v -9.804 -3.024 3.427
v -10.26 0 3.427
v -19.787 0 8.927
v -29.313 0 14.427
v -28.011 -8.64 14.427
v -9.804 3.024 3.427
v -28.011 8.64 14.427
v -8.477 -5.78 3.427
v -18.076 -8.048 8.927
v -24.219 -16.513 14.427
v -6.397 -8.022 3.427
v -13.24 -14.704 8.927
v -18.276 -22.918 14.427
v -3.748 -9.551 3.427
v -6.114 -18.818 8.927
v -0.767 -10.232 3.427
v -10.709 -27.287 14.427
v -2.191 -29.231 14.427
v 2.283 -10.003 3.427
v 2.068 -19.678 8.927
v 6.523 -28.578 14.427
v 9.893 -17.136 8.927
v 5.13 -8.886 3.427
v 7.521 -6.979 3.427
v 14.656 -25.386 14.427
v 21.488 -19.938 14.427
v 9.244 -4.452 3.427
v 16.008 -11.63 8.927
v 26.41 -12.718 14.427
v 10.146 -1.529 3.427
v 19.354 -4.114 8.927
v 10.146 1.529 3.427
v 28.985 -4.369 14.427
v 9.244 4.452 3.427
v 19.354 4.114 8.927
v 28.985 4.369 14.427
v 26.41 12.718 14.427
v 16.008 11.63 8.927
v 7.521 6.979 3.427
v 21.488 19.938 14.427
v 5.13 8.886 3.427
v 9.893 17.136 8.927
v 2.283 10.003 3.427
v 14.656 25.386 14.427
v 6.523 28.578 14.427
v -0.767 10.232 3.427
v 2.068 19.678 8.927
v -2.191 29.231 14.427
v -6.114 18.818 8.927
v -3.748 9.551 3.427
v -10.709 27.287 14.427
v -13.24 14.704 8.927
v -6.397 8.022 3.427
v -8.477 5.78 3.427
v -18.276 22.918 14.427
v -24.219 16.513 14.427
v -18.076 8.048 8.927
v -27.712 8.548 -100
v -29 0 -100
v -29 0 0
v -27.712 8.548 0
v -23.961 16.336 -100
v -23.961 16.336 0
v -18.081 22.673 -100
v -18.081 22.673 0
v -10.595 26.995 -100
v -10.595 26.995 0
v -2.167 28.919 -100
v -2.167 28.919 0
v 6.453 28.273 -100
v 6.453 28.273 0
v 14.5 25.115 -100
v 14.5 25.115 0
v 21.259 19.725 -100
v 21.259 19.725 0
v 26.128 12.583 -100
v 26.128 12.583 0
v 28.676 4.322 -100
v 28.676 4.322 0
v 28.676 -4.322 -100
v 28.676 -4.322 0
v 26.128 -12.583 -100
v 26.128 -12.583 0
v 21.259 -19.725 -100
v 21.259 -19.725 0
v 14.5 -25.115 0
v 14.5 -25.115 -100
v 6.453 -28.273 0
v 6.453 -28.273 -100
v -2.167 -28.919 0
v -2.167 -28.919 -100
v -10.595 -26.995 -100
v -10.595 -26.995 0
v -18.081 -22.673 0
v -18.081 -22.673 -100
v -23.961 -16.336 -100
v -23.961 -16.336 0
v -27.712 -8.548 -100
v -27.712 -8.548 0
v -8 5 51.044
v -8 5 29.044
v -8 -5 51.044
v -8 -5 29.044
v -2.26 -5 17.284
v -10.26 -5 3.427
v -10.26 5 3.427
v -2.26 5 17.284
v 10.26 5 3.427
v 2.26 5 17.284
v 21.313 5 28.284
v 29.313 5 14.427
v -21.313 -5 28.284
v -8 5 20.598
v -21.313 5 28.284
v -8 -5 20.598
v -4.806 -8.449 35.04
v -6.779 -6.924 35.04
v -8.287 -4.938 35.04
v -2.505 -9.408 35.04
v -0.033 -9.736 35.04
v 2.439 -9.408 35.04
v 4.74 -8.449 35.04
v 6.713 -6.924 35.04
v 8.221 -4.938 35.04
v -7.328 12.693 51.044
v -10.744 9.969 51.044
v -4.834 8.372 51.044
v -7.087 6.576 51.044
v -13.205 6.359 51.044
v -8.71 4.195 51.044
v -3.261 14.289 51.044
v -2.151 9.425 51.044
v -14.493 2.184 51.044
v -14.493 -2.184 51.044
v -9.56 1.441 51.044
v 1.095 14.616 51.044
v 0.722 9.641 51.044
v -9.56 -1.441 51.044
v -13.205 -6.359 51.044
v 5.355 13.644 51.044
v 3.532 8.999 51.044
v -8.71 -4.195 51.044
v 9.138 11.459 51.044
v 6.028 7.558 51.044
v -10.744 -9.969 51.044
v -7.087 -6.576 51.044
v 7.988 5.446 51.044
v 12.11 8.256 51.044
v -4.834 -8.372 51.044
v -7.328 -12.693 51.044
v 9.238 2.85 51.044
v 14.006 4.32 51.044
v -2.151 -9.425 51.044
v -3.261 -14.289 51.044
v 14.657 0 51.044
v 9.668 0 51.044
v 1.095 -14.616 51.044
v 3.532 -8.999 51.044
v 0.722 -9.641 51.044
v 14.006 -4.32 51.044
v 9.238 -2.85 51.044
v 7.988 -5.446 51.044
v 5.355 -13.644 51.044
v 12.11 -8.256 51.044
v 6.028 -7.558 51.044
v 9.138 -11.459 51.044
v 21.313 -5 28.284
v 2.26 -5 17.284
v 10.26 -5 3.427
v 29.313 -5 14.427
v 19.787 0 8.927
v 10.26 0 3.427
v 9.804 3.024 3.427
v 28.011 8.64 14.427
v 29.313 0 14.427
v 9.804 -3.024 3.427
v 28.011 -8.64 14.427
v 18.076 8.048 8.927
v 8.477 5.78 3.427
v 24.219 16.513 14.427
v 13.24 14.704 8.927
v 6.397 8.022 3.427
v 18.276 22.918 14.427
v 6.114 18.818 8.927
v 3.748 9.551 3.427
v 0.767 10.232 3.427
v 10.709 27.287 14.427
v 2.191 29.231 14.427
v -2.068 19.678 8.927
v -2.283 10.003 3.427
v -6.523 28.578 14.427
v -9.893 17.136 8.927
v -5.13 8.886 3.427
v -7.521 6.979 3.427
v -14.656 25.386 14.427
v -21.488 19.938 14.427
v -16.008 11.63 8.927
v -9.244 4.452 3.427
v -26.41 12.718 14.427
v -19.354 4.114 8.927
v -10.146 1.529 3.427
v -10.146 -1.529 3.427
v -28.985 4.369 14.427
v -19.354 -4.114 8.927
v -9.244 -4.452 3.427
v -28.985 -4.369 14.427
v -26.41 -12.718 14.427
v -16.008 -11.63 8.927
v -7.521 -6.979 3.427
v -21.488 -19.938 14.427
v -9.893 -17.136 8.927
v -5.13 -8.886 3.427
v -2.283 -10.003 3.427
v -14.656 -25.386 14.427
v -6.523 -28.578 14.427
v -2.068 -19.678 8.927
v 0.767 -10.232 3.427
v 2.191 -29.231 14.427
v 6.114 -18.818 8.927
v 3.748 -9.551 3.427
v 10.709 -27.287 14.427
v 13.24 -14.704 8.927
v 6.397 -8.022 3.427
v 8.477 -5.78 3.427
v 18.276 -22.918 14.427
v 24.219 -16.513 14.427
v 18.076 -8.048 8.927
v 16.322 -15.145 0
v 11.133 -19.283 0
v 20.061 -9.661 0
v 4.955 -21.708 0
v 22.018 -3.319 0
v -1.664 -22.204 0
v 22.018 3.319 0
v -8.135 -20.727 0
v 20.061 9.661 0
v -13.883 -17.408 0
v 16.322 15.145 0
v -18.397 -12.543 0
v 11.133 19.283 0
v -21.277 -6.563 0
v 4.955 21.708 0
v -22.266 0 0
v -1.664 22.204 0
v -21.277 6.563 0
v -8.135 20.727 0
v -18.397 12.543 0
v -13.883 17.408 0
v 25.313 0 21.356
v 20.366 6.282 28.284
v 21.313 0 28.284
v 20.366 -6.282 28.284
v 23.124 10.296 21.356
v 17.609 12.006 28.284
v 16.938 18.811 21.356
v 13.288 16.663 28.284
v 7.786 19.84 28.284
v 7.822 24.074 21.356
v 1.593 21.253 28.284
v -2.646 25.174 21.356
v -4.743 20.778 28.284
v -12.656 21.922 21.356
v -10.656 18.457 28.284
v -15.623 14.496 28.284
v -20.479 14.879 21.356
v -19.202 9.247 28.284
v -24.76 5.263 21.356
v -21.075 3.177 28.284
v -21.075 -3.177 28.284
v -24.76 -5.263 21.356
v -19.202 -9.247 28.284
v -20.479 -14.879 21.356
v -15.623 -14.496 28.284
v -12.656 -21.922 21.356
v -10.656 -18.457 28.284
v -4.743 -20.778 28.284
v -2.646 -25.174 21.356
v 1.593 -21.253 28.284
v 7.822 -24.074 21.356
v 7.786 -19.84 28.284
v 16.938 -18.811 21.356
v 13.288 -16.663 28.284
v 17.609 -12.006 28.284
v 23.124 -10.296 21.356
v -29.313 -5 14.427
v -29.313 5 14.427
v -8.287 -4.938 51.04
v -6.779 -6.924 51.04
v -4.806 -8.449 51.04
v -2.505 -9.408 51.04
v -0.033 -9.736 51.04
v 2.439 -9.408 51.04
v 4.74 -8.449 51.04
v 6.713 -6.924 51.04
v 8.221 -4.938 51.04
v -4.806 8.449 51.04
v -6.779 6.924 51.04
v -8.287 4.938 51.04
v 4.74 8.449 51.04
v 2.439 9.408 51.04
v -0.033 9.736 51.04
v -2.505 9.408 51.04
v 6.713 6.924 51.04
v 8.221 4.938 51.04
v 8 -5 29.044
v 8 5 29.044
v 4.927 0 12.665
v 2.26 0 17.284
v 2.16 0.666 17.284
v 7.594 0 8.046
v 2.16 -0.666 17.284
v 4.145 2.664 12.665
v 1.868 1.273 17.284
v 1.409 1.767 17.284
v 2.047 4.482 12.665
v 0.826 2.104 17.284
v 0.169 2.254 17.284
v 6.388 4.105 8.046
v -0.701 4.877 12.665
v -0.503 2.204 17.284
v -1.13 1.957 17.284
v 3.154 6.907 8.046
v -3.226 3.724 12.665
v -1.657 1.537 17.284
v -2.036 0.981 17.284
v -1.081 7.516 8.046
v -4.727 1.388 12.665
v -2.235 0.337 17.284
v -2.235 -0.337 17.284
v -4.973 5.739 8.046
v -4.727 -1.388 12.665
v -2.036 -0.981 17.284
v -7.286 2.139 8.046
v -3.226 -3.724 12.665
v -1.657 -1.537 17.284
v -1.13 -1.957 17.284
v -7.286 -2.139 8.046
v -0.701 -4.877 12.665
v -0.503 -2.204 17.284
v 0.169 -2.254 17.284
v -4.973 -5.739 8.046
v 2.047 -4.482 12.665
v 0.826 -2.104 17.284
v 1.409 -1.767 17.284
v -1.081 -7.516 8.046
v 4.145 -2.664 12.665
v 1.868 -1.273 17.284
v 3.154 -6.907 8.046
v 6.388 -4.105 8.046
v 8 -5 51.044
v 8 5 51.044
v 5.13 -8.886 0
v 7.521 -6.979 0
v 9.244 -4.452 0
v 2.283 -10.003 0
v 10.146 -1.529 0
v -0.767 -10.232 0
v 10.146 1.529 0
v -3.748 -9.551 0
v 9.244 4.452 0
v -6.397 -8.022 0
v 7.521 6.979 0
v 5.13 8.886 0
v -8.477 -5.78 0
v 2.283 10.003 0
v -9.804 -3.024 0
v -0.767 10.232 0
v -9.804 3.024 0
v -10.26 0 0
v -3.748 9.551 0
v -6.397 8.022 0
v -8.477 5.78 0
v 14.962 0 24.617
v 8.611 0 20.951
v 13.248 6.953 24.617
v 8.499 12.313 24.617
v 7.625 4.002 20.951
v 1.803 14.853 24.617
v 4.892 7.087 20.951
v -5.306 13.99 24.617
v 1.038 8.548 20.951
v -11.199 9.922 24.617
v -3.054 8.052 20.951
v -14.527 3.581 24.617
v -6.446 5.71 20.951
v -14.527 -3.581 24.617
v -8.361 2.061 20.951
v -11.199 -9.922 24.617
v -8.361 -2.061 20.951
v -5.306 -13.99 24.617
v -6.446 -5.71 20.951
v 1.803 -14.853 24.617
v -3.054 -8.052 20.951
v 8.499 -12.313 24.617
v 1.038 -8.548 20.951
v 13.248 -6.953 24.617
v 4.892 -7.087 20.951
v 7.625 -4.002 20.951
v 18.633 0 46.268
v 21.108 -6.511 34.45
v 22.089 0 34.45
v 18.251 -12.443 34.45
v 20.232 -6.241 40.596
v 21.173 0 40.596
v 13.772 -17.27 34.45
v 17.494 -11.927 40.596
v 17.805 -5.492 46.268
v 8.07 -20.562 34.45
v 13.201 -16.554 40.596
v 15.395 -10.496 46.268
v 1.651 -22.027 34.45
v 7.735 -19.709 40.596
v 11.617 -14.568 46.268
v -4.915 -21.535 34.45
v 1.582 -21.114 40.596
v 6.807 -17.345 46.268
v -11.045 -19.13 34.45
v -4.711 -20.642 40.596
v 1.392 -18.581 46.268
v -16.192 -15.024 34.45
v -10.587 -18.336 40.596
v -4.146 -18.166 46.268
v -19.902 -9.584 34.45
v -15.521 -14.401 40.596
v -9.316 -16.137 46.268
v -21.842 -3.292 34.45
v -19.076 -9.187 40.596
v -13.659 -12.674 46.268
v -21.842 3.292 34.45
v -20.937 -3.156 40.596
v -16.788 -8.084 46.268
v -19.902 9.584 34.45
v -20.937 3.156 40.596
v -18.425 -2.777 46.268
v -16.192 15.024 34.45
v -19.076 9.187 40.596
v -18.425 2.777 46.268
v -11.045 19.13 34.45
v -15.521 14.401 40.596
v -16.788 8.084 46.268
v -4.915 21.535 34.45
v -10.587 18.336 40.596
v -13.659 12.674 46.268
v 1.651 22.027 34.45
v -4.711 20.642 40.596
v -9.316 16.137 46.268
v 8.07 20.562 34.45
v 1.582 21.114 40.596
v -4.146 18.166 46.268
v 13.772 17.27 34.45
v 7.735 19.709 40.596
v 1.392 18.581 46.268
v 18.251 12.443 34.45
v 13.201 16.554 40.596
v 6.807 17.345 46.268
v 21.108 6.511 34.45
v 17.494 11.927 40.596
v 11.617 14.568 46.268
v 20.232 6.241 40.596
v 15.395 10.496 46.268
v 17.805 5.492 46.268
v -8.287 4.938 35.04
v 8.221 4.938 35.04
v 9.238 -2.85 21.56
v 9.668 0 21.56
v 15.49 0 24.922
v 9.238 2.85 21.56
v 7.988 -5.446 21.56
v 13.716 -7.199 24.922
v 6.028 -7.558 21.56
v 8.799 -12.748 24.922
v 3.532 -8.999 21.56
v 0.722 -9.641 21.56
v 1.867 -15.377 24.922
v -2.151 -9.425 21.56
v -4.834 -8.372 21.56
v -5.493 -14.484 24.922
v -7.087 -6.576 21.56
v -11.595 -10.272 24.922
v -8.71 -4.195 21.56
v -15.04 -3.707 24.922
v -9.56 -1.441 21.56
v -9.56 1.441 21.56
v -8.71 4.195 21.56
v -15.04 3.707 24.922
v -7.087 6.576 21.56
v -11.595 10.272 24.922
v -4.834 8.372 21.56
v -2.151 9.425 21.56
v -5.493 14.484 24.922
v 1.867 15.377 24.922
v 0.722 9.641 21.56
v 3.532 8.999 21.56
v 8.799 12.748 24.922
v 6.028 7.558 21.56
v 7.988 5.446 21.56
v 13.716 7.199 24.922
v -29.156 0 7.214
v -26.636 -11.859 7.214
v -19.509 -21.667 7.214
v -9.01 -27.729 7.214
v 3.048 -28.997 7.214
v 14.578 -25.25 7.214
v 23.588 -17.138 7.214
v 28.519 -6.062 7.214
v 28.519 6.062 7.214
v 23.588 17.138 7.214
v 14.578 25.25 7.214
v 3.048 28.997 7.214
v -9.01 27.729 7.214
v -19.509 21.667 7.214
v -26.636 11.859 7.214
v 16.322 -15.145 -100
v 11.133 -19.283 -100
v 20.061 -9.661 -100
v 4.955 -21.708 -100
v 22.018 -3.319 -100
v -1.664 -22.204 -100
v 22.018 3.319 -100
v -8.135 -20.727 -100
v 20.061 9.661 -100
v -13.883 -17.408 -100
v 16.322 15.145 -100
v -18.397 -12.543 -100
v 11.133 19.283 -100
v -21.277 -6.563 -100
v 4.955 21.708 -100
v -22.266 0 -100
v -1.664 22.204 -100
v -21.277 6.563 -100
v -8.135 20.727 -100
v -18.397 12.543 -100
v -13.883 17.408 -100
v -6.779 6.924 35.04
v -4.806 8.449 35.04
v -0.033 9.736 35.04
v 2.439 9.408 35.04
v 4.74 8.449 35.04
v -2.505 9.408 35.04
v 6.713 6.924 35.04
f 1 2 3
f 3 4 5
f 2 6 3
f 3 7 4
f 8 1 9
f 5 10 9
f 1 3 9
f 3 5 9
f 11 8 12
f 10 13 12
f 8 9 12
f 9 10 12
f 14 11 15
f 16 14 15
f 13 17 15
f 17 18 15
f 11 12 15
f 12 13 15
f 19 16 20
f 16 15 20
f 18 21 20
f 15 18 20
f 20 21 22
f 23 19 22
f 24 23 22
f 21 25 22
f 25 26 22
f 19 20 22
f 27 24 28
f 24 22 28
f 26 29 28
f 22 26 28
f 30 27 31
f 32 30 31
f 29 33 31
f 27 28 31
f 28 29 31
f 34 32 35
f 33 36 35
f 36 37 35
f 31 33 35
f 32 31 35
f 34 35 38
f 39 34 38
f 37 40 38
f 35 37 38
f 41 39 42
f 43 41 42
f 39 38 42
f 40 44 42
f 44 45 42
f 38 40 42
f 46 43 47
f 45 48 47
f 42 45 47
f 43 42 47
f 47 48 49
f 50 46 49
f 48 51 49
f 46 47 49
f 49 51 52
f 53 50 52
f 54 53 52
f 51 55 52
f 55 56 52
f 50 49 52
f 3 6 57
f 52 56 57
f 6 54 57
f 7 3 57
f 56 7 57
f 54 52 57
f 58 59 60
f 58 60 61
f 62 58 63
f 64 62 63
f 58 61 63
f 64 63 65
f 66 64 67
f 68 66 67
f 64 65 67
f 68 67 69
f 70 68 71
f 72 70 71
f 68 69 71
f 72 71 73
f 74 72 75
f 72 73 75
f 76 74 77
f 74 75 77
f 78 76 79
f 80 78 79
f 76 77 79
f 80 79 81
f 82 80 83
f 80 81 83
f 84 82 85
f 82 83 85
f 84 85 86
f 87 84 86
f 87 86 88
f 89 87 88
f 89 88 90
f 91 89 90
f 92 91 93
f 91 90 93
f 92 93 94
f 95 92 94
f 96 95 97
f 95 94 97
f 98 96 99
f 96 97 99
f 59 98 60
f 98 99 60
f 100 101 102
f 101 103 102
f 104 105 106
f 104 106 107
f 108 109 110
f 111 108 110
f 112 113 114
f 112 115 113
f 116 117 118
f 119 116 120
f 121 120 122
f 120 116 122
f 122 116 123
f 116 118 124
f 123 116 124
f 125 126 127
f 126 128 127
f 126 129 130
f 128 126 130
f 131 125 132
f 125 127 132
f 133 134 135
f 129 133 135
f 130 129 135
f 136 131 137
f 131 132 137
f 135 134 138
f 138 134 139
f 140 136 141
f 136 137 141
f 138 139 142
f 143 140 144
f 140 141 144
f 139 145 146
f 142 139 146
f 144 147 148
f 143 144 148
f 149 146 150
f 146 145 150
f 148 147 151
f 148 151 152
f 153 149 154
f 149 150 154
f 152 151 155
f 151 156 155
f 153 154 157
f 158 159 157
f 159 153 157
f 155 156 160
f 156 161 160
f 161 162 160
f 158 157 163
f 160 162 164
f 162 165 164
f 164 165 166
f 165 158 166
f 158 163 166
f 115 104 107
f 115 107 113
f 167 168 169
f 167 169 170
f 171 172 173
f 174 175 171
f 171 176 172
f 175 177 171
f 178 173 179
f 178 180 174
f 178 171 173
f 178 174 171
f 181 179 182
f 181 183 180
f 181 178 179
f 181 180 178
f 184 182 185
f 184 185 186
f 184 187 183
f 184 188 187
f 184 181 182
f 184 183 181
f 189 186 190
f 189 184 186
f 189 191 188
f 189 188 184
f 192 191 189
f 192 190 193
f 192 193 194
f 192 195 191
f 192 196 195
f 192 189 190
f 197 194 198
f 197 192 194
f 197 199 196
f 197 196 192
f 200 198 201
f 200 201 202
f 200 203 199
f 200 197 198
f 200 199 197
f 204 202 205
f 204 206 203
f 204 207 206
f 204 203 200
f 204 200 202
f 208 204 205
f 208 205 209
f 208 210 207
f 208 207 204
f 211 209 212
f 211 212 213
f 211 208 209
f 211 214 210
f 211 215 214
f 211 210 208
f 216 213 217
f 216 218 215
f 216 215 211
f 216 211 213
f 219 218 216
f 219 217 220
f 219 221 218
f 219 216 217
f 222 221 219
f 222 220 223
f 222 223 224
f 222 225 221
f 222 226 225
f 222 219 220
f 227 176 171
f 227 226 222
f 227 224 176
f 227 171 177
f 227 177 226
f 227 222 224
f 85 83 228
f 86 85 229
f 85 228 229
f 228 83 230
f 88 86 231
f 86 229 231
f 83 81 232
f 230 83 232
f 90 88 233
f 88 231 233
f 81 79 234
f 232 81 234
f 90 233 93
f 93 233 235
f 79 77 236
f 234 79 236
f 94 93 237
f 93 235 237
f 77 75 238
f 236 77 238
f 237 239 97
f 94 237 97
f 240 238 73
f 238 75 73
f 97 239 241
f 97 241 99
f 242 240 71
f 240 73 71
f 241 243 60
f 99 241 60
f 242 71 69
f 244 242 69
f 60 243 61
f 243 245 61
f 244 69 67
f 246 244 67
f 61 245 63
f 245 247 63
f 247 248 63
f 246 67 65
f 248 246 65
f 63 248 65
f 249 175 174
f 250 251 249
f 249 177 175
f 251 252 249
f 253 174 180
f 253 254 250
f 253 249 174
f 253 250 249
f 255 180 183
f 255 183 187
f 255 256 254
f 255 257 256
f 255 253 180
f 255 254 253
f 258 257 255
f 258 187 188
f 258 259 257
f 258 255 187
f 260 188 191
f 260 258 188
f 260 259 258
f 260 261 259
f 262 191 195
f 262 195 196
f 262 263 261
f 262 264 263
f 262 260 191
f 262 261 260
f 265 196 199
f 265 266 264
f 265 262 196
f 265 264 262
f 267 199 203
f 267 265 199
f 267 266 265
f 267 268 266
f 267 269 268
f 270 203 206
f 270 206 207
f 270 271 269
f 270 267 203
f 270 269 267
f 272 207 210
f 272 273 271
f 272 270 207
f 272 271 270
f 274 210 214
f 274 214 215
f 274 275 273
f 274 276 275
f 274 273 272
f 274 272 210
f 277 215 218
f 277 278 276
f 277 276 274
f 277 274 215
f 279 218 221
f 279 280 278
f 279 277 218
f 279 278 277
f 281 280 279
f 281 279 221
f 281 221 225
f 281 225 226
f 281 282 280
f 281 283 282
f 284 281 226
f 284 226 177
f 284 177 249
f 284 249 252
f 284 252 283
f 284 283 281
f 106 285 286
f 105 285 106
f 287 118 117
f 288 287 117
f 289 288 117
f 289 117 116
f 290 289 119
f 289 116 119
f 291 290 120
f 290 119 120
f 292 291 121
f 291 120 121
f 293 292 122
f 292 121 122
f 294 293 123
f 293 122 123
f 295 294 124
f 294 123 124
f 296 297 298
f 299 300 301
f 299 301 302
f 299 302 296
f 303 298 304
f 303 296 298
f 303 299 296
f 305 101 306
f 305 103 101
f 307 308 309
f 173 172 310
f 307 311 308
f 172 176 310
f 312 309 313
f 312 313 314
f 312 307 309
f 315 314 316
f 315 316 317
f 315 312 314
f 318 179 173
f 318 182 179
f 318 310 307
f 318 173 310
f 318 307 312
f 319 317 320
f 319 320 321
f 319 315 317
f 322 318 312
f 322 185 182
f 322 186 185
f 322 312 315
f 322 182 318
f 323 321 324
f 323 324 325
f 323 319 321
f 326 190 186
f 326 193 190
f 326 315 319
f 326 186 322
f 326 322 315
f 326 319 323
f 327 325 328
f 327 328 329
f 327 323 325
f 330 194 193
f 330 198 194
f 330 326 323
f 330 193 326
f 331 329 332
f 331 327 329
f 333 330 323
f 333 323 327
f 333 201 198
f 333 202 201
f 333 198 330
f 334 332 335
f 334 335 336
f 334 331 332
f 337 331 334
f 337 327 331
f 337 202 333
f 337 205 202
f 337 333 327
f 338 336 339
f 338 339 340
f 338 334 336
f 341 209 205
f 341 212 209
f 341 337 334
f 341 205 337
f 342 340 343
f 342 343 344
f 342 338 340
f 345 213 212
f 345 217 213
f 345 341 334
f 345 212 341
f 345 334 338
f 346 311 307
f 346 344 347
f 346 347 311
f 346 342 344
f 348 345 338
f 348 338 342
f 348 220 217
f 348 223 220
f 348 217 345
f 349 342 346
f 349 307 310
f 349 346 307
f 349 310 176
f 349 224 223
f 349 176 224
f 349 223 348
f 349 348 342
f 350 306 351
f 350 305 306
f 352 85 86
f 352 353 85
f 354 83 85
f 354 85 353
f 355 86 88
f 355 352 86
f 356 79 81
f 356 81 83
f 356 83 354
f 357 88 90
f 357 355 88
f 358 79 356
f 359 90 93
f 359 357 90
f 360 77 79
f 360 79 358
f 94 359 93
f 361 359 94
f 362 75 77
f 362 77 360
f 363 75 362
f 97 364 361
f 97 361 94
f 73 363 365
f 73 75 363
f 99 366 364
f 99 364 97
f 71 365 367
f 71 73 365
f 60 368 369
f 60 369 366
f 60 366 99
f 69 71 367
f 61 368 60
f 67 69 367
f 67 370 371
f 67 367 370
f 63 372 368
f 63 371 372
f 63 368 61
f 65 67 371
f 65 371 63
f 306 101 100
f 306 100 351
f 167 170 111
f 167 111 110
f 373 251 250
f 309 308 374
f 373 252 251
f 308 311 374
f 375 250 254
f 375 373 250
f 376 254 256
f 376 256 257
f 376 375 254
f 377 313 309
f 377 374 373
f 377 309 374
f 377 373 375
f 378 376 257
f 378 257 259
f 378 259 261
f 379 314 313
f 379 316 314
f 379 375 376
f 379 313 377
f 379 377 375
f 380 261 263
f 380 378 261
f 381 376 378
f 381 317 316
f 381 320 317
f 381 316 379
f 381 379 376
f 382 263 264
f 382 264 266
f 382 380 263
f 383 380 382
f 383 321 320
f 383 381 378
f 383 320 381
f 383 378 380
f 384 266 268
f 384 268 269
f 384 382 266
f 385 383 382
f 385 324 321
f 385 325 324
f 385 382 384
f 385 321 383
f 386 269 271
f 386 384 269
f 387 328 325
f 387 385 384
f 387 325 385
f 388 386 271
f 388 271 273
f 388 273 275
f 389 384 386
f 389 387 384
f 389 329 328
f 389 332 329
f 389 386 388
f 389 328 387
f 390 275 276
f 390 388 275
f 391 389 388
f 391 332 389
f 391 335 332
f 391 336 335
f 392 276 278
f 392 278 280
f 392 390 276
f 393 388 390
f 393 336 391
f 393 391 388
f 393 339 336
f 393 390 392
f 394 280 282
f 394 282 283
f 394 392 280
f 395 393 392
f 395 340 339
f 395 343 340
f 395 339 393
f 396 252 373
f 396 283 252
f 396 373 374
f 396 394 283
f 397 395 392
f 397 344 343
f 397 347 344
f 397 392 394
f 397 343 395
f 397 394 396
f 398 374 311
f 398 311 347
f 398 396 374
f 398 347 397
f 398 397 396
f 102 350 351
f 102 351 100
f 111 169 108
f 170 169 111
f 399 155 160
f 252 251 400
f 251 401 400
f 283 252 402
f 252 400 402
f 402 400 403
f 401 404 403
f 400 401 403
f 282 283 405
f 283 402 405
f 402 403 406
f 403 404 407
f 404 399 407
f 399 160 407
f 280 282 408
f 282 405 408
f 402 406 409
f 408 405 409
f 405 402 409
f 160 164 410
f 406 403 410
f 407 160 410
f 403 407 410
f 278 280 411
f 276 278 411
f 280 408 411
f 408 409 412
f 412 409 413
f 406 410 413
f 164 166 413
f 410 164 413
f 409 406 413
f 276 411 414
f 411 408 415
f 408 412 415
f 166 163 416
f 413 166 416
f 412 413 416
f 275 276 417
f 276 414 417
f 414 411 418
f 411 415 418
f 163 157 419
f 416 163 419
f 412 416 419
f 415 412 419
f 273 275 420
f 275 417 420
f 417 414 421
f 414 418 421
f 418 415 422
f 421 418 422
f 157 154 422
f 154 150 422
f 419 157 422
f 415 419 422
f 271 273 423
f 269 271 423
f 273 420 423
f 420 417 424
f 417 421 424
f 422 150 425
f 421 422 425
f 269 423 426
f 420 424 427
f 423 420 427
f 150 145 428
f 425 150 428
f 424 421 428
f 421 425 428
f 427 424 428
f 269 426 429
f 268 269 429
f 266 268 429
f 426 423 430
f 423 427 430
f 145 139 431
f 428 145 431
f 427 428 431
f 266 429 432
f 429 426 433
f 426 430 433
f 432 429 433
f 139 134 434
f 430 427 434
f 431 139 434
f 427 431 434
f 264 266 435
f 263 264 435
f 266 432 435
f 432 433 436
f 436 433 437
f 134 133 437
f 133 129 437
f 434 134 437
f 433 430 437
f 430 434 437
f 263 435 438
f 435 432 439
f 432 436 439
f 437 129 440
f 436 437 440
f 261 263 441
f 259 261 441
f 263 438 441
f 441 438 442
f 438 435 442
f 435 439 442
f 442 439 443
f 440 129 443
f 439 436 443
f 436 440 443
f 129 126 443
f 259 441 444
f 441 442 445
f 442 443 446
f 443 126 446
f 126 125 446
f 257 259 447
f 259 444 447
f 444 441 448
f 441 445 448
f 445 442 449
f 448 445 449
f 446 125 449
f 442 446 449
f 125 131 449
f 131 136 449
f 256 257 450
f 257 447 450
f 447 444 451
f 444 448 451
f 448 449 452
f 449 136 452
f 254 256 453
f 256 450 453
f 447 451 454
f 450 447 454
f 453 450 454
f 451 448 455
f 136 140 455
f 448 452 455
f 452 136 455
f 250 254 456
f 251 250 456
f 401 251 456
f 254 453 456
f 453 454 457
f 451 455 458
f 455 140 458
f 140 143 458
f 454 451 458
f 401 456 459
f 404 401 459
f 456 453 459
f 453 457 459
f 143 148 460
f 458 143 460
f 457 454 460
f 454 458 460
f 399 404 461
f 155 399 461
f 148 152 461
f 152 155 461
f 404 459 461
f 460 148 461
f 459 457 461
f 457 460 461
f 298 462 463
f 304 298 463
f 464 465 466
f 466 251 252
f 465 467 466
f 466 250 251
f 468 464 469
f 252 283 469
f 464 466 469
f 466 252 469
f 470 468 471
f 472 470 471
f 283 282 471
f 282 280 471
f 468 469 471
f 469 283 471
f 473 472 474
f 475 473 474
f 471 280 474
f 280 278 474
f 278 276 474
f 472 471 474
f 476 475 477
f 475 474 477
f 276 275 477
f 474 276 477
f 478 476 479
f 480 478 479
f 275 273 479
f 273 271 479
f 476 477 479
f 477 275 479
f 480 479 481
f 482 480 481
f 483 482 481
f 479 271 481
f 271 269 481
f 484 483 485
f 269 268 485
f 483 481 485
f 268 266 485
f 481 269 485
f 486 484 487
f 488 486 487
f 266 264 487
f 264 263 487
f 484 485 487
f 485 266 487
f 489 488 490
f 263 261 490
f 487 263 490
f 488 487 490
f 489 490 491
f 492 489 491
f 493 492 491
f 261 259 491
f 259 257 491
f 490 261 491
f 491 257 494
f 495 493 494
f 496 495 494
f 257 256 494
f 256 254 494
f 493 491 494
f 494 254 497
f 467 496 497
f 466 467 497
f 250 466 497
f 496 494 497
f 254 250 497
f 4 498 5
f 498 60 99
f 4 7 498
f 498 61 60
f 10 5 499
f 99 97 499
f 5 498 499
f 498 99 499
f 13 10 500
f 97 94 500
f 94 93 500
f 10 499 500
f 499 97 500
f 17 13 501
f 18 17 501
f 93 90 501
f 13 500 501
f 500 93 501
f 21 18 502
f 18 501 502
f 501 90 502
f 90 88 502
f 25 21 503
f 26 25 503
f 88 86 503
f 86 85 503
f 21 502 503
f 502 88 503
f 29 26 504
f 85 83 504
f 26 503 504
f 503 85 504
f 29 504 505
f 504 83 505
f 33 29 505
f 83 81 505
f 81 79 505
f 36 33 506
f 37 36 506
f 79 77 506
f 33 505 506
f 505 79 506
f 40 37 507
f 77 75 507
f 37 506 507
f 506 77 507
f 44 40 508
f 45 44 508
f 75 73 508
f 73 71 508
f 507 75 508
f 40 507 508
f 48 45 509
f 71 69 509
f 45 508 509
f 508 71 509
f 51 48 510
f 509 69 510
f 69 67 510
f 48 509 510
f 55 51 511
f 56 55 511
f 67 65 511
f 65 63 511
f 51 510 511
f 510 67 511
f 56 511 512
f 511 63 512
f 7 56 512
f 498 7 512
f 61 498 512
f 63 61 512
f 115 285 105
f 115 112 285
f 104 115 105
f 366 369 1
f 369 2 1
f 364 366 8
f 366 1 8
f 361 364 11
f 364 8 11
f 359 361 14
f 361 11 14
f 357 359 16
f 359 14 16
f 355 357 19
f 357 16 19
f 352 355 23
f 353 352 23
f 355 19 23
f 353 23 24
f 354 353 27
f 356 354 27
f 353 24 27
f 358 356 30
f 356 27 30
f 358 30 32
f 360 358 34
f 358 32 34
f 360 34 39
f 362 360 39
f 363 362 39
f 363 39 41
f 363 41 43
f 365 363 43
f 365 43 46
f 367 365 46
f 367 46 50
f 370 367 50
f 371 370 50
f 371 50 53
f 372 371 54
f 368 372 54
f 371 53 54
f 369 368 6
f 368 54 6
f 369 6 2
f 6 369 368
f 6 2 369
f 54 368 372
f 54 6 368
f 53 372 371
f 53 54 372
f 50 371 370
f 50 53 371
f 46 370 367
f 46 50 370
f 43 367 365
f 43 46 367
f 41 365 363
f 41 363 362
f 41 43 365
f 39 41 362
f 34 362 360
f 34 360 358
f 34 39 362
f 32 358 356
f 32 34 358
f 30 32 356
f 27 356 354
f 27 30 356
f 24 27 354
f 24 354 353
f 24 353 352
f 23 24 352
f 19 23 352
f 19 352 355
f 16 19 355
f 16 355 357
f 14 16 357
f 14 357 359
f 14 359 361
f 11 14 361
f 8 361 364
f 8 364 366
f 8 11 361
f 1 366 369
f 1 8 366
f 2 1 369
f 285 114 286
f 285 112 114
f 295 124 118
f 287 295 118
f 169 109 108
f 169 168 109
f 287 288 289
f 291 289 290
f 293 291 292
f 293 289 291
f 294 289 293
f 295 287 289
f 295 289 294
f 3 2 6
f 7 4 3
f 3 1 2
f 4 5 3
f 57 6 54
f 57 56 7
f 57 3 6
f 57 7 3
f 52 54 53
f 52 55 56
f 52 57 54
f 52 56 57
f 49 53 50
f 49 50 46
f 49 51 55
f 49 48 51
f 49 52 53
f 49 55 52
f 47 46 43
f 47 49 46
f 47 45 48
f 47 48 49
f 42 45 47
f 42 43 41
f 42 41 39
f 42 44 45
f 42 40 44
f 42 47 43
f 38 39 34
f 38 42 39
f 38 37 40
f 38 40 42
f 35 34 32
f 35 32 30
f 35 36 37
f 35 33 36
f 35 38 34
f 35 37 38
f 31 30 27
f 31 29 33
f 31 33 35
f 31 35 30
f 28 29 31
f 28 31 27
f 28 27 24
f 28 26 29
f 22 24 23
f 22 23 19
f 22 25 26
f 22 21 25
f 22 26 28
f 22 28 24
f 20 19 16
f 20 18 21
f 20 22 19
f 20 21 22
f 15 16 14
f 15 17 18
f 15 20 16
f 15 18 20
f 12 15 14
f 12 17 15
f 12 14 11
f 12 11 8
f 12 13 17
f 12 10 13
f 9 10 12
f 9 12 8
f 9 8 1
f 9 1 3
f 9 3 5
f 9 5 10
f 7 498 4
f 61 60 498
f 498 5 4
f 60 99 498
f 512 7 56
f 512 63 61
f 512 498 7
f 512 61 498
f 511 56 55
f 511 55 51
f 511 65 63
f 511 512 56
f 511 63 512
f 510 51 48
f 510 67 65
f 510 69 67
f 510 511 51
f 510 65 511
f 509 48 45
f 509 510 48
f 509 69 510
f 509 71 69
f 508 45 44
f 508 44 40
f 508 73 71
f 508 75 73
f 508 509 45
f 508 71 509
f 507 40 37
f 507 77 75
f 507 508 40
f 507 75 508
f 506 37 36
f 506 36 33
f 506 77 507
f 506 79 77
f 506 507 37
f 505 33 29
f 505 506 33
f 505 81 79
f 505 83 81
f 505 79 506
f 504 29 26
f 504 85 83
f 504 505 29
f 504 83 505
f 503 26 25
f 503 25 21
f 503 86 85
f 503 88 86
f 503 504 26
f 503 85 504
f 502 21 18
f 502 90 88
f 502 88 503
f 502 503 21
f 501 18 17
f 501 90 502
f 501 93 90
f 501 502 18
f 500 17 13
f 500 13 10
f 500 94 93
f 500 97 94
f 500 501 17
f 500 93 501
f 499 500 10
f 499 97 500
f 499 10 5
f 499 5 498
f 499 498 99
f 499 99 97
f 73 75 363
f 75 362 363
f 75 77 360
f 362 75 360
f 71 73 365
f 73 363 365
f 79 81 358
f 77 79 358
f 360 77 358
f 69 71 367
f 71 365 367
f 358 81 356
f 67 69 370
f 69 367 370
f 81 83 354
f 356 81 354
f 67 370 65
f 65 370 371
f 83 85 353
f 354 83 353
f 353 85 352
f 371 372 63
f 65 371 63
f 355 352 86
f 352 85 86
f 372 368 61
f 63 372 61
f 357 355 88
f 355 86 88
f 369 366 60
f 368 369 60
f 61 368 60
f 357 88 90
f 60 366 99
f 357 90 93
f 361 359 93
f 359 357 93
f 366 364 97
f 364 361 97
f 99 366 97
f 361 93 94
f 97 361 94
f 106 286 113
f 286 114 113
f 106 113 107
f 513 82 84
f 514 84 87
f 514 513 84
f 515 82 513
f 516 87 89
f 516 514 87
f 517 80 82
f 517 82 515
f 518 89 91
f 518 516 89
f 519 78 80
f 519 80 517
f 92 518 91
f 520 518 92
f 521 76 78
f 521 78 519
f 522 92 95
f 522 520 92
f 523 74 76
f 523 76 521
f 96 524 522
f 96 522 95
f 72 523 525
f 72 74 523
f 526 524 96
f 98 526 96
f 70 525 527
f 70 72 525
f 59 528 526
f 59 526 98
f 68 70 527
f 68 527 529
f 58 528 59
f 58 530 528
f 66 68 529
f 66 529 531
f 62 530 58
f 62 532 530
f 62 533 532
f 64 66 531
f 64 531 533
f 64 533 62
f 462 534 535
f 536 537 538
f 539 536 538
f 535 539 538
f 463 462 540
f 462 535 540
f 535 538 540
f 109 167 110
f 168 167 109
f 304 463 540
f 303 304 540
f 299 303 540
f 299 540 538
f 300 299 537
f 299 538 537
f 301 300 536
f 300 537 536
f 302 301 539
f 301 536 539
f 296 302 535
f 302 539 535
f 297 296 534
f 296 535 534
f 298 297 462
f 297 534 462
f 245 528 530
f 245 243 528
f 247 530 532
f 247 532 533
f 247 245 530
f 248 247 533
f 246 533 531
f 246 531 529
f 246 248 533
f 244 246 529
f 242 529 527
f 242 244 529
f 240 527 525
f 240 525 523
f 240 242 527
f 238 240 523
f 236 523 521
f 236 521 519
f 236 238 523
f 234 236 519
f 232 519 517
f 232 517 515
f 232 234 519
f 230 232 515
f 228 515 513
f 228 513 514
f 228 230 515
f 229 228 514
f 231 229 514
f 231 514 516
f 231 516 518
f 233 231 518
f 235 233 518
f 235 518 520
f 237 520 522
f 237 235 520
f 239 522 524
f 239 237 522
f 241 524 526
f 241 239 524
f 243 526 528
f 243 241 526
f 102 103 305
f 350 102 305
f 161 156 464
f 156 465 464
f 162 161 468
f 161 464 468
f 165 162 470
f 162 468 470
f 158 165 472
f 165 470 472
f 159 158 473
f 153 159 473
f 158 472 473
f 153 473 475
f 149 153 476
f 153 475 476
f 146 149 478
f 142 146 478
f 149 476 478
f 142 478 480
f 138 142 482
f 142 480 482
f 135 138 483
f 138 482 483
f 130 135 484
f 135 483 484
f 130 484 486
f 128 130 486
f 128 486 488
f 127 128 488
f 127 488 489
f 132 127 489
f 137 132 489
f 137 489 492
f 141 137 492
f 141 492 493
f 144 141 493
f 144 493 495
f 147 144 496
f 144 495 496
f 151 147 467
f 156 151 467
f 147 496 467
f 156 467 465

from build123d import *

# Parameters (mm, degrees)
F1_DEPTH = 5
F0_W     = 8
F0_H     = 22
F0_W_2   = 6.7338001877
F0_H_2   = 100
F5_DEPTH = 16
F7_DEPTH = 16


# Not quite as in the source:
# - after a boolean that leaves OpenCascade's solid faulty, fix() repairs it


with BuildPart() as f1:
    # F0 (on Front) → F1 (new body, symmetric)
    with BuildSketch(Plane.XZ):
        Polygon((2.2602713382, 17.2838520708), (10.2602713382, 3.4274456103), (29.3128302215, 14.4274456103), (21.3128302215, 28.2838520708), (9.6675436944, 21.5604427596), align=None)
    extrude(amount=F1_DEPTH, both=True)


with BuildPart() as f1b:
    # F0 (on Front) → F1, piece 2 (new body, symmetric)
    with BuildSketch(Plane.XZ):
        Polygon((-29.3128302215, 14.4274456103), (-10.2602713382, 3.4274456103), (-2.2602713382, 17.2838520708), (-8, 20.5976859588), (-21.3128302215, 28.2838520708), align=None)
    extrude(amount=F1_DEPTH, both=True)


with BuildPart() as f1c:
    # F0 (on Front) → F1, piece 3 (new body, symmetric)
    with BuildSketch(Plane.XZ):
        with Locations((4, 40.0443450212)):
            Rectangle(F0_W, F0_H)
        with Locations((-4, 40.0443450212)):
            Rectangle(F0_W, F0_H)
    extrude(amount=F1_DEPTH, both=True)


with BuildPart() as f2:
    # F0 (on Front) → F2 (revolve)
    with BuildSketch(Plane.XZ):
        with Locations((-25.6330999061, -50)):
            Rectangle(F0_W_2, F0_H_2)
    revolve(axis=Axis((0, 0, -50), (0, 0, -1)))


with BuildPart() as f3:
    # F0 (on Front) → F3 (revolve)
    with BuildSketch(Plane.XZ):
        with BuildLine():
            Line((9.6675436944, 21.5604427596), (21.3128302215, 28.2838520708))
            ThreePointArc((21.3128302215, 28.2838520708), (21.1730407744, 40.5964594654), (14.6567896008, 51.0443450212))
            Line((14.6567896008, 51.0443450212), (9.6675436944, 51.0443450212))
            Line((9.6675436944, 51.0443450212), (9.6675436944, 21.5604427596))
        make_face()
    revolve(axis=Axis((0, 0, 14.5221725106), (0, 0, -1)))


with BuildPart() as f5:
    # F4 (on Top) → F5 (new body)
    with BuildSketch(Plane.XY):
        with BuildLine():
            ThreePointArc((-8.2867536694, -4.938212689), (-0.0331071205, -9.7356702002), (8.2205394283, -4.938212689))
            Line((8.2205394283, -4.938212689), (-8.2867536694, -4.938212689))
        make_face()
    extrude(amount=F5_DEPTH)


with BuildPart() as f5_1:
    # F6: moved
    add(f5.part.moved(Location((0, 0, 35.04))))


with BuildPart() as f7:
    # F4 (on Top) → F7 (new body)
    with BuildSketch(Plane.XY):
        with BuildLine():
            Line((-8.2867536694, 4.938212689), (8.2205394283, 4.938212689))
            ThreePointArc((8.2205394283, 4.938212689), (-0.0331071205, 9.7356702002), (-8.2867536694, 4.938212689))
        make_face()
    extrude(amount=F7_DEPTH)


with BuildPart() as f7_1:
    # F8: moved
    add(f7.part.moved(Location((0, 0, 35.04))))


with BuildPart() as f9:
    # F0 (on Front) → F9 (revolve)
    with BuildSketch(Plane.XZ):
        Polygon((-10.2602713382, 0), (-10.2602713382, 3.4274456103), (-29.3128302215, 14.4274456103), (-29, 0), (-22.2661998123, 0), align=None)
    revolve(axis=Axis((0, 0, 25.5221725106), (0, 0, 1)))


with BuildPart() as f10:
    # F0 (on Front) → F10 (revolve)
    with BuildSketch(Plane.XZ):
        Polygon((-10.2602713382, 0), (-10.2602713382, 3.4274456103), (-29.3128302215, 14.4274456103), (-29, 0), (-22.2661998123, 0), align=None)
    revolve(axis=Axis((0, 0, -50), (0, 0, -1)))


with BuildPart() as f11:
    # F0 (on Front) → F11 (revolve)
    with BuildSketch(Plane.XZ):
        Polygon((2.2602713382, 17.2838520708), (10.2602713382, 3.4274456103), (29.3128302215, 14.4274456103), (21.3128302215, 28.2838520708), (9.6675436944, 21.5604427596), align=None)
    revolve(axis=Axis((0, 0, 25.5221725106), (0, 0, 1)))

    add(f11.part.fix(), mode=Mode.REPLACE)


solid = Compound([f1.part, f1b.part, f1c.part, f2.part, f3.part, f5_1.part, f7_1.part, f9.part, f10.part, f11.part])
